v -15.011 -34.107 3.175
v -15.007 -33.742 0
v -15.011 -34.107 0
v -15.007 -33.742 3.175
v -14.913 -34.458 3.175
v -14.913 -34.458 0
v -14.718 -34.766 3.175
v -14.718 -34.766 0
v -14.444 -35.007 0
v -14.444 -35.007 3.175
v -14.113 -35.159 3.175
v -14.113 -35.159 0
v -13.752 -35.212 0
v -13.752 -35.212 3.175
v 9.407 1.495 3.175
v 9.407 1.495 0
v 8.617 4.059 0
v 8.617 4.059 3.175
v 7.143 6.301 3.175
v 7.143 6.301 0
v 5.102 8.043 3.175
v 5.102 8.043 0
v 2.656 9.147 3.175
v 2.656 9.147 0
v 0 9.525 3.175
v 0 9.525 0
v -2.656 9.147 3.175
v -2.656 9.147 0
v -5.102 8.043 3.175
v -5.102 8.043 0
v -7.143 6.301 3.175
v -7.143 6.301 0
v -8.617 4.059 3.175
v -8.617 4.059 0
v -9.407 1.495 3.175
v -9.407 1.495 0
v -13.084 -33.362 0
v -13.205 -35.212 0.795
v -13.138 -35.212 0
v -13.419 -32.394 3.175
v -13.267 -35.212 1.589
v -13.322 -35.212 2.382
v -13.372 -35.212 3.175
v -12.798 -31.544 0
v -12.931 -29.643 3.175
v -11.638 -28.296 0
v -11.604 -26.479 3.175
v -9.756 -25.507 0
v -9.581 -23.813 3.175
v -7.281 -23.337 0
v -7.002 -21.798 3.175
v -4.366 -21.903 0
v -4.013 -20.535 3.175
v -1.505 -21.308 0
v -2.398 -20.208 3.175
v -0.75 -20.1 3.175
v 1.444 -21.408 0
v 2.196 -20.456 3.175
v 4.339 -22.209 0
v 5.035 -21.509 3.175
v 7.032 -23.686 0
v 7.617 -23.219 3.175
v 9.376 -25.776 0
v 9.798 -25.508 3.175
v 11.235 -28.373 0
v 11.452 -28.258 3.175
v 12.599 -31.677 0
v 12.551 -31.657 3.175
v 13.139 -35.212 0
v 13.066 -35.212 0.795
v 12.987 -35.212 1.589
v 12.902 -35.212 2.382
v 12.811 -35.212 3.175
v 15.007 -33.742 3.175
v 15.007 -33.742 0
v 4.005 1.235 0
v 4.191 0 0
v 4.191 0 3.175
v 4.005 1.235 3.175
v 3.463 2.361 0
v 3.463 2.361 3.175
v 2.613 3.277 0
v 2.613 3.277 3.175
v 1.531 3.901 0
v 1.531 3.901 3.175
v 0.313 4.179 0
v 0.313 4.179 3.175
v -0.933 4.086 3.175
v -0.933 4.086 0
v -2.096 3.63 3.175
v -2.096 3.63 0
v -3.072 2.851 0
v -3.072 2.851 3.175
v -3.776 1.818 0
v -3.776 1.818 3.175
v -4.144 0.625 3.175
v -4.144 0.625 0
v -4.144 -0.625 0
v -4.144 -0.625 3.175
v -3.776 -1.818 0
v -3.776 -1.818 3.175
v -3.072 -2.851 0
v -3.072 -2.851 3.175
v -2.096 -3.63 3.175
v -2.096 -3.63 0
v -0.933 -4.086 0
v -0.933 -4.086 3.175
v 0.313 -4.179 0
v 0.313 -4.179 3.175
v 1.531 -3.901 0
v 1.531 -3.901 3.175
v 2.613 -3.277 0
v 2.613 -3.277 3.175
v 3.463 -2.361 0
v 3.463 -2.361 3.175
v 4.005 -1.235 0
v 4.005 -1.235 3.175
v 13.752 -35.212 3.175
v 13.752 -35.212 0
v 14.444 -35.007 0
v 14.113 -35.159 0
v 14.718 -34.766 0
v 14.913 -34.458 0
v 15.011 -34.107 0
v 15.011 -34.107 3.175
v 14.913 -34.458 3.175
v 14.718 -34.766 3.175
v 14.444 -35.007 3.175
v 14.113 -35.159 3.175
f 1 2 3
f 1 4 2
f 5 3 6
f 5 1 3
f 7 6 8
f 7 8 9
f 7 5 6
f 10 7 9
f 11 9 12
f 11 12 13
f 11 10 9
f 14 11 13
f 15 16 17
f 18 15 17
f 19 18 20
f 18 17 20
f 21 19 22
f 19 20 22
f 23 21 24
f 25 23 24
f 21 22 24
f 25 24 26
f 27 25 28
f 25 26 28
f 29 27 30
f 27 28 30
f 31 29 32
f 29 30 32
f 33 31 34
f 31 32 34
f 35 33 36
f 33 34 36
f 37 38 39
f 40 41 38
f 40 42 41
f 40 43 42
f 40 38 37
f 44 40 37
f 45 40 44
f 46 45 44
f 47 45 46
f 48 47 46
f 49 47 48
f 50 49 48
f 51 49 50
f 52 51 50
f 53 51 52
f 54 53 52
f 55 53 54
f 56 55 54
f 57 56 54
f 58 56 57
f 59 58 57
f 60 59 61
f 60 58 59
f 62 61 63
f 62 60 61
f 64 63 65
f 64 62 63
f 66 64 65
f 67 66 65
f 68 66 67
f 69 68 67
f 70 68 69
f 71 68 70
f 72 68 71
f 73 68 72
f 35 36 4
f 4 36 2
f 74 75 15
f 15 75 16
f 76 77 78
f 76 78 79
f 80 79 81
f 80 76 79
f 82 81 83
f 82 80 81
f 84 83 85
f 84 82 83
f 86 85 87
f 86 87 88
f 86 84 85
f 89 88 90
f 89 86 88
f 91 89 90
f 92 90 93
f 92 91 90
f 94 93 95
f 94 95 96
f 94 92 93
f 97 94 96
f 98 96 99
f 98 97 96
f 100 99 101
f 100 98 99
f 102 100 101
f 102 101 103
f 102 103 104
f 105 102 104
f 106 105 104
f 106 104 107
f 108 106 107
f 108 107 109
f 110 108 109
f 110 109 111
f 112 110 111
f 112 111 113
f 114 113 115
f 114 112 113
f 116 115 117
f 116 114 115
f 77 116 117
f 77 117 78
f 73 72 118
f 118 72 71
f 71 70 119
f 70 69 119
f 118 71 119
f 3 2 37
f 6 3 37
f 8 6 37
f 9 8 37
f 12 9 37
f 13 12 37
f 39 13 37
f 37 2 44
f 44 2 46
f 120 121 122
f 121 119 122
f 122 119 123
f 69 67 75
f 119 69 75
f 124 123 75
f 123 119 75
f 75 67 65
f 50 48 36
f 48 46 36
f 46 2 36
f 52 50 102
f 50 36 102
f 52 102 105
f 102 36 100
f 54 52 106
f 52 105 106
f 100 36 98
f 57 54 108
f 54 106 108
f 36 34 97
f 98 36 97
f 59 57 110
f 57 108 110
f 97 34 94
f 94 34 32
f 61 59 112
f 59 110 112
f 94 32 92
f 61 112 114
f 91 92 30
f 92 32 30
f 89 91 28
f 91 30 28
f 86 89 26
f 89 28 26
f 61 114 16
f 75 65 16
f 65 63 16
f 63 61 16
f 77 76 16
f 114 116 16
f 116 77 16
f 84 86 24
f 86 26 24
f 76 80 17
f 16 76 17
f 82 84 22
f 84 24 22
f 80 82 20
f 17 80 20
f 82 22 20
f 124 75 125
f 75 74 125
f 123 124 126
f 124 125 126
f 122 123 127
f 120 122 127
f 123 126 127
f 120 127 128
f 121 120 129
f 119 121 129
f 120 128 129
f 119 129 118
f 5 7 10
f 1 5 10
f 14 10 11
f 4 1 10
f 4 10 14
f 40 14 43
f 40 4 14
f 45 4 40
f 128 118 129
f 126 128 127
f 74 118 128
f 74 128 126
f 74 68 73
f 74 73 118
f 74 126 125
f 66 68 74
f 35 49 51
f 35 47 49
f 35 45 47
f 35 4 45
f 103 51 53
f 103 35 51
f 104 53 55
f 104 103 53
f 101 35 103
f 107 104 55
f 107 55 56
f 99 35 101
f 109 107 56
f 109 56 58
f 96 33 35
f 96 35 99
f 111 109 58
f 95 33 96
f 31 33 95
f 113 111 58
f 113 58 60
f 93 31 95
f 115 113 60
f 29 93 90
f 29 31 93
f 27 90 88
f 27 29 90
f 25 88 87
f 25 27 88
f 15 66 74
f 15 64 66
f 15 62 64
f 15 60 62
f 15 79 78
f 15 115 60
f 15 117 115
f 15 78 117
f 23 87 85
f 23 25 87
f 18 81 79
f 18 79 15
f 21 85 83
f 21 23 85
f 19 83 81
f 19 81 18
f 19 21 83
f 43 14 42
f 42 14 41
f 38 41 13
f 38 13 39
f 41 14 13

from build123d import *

# Parameters (mm, degrees)
SKETCH1_R           = 4.191
BOSS_EXTRUDE1_DEPTH = 3.175
CAVITY1_START       = 3.689049998
CAVITY1_DEPTH       = 9.603434939
FILLET3_R           = 1.27


# Read off the part's stored shape, not the designer's step: Cavity1
with BuildPart() as part:
    # Sketch1 → Boss-Extrude1 (new body)
    with BuildSketch(Plane.XY):
        with BuildLine():
            ThreePointArc((9.406966983, 1.494856913), (0, 9.525), (-9.406966983, 1.494856913))
            Line((-9.406966983, 1.494856913), (-15.24, -35.211766))
            Line((-15.24, -35.211766), (15.24, -35.211766))
            Line((15.24, -35.211766), (9.406966983, 1.494856913))
        make_face()
        Circle(SKETCH1_R, mode=Mode.SUBTRACT)
    extrude(amount=BOSS_EXTRUDE1_DEPTH)

    # Cavity1 outline → Cavity1 (cut)
    with BuildSketch(Plane(origin=(0, 0, 0), x_dir=(0.9955947349362284, 0.032256539947670526, 0.08803771576924041), z_dir=(0.09376099278090663, -0.3425138790307331, -0.9348225066311033)).offset(CAVITY1_START)):
        with BuildLine():
            Line((-14.012226084, 36), (-14.169183947, 34.154693399))
            ThreePointArc((-14.169183947, 34.154693399), (-1.135248211, 19.965054491), (11.898687525, 34.154693399))
            Line((11.898687525, 34.154693399), (11.741729662, 36))
            Line((11.741729662, 36), (-14.012226084, 36))
        make_face()
    extrude(amount=CAVITY1_DEPTH, mode=Mode.SUBTRACT)

    # Fillet3
    fillet3_edges = [part.edges().sort_by_distance(p)[0] for p in [
        (-15.24, -35.211766, 1.5875),
        (15.24, -35.211766, 1.5875),
    ]]
    fillet(fillet3_edges, radius=FILLET3_R)


solid = part.part
